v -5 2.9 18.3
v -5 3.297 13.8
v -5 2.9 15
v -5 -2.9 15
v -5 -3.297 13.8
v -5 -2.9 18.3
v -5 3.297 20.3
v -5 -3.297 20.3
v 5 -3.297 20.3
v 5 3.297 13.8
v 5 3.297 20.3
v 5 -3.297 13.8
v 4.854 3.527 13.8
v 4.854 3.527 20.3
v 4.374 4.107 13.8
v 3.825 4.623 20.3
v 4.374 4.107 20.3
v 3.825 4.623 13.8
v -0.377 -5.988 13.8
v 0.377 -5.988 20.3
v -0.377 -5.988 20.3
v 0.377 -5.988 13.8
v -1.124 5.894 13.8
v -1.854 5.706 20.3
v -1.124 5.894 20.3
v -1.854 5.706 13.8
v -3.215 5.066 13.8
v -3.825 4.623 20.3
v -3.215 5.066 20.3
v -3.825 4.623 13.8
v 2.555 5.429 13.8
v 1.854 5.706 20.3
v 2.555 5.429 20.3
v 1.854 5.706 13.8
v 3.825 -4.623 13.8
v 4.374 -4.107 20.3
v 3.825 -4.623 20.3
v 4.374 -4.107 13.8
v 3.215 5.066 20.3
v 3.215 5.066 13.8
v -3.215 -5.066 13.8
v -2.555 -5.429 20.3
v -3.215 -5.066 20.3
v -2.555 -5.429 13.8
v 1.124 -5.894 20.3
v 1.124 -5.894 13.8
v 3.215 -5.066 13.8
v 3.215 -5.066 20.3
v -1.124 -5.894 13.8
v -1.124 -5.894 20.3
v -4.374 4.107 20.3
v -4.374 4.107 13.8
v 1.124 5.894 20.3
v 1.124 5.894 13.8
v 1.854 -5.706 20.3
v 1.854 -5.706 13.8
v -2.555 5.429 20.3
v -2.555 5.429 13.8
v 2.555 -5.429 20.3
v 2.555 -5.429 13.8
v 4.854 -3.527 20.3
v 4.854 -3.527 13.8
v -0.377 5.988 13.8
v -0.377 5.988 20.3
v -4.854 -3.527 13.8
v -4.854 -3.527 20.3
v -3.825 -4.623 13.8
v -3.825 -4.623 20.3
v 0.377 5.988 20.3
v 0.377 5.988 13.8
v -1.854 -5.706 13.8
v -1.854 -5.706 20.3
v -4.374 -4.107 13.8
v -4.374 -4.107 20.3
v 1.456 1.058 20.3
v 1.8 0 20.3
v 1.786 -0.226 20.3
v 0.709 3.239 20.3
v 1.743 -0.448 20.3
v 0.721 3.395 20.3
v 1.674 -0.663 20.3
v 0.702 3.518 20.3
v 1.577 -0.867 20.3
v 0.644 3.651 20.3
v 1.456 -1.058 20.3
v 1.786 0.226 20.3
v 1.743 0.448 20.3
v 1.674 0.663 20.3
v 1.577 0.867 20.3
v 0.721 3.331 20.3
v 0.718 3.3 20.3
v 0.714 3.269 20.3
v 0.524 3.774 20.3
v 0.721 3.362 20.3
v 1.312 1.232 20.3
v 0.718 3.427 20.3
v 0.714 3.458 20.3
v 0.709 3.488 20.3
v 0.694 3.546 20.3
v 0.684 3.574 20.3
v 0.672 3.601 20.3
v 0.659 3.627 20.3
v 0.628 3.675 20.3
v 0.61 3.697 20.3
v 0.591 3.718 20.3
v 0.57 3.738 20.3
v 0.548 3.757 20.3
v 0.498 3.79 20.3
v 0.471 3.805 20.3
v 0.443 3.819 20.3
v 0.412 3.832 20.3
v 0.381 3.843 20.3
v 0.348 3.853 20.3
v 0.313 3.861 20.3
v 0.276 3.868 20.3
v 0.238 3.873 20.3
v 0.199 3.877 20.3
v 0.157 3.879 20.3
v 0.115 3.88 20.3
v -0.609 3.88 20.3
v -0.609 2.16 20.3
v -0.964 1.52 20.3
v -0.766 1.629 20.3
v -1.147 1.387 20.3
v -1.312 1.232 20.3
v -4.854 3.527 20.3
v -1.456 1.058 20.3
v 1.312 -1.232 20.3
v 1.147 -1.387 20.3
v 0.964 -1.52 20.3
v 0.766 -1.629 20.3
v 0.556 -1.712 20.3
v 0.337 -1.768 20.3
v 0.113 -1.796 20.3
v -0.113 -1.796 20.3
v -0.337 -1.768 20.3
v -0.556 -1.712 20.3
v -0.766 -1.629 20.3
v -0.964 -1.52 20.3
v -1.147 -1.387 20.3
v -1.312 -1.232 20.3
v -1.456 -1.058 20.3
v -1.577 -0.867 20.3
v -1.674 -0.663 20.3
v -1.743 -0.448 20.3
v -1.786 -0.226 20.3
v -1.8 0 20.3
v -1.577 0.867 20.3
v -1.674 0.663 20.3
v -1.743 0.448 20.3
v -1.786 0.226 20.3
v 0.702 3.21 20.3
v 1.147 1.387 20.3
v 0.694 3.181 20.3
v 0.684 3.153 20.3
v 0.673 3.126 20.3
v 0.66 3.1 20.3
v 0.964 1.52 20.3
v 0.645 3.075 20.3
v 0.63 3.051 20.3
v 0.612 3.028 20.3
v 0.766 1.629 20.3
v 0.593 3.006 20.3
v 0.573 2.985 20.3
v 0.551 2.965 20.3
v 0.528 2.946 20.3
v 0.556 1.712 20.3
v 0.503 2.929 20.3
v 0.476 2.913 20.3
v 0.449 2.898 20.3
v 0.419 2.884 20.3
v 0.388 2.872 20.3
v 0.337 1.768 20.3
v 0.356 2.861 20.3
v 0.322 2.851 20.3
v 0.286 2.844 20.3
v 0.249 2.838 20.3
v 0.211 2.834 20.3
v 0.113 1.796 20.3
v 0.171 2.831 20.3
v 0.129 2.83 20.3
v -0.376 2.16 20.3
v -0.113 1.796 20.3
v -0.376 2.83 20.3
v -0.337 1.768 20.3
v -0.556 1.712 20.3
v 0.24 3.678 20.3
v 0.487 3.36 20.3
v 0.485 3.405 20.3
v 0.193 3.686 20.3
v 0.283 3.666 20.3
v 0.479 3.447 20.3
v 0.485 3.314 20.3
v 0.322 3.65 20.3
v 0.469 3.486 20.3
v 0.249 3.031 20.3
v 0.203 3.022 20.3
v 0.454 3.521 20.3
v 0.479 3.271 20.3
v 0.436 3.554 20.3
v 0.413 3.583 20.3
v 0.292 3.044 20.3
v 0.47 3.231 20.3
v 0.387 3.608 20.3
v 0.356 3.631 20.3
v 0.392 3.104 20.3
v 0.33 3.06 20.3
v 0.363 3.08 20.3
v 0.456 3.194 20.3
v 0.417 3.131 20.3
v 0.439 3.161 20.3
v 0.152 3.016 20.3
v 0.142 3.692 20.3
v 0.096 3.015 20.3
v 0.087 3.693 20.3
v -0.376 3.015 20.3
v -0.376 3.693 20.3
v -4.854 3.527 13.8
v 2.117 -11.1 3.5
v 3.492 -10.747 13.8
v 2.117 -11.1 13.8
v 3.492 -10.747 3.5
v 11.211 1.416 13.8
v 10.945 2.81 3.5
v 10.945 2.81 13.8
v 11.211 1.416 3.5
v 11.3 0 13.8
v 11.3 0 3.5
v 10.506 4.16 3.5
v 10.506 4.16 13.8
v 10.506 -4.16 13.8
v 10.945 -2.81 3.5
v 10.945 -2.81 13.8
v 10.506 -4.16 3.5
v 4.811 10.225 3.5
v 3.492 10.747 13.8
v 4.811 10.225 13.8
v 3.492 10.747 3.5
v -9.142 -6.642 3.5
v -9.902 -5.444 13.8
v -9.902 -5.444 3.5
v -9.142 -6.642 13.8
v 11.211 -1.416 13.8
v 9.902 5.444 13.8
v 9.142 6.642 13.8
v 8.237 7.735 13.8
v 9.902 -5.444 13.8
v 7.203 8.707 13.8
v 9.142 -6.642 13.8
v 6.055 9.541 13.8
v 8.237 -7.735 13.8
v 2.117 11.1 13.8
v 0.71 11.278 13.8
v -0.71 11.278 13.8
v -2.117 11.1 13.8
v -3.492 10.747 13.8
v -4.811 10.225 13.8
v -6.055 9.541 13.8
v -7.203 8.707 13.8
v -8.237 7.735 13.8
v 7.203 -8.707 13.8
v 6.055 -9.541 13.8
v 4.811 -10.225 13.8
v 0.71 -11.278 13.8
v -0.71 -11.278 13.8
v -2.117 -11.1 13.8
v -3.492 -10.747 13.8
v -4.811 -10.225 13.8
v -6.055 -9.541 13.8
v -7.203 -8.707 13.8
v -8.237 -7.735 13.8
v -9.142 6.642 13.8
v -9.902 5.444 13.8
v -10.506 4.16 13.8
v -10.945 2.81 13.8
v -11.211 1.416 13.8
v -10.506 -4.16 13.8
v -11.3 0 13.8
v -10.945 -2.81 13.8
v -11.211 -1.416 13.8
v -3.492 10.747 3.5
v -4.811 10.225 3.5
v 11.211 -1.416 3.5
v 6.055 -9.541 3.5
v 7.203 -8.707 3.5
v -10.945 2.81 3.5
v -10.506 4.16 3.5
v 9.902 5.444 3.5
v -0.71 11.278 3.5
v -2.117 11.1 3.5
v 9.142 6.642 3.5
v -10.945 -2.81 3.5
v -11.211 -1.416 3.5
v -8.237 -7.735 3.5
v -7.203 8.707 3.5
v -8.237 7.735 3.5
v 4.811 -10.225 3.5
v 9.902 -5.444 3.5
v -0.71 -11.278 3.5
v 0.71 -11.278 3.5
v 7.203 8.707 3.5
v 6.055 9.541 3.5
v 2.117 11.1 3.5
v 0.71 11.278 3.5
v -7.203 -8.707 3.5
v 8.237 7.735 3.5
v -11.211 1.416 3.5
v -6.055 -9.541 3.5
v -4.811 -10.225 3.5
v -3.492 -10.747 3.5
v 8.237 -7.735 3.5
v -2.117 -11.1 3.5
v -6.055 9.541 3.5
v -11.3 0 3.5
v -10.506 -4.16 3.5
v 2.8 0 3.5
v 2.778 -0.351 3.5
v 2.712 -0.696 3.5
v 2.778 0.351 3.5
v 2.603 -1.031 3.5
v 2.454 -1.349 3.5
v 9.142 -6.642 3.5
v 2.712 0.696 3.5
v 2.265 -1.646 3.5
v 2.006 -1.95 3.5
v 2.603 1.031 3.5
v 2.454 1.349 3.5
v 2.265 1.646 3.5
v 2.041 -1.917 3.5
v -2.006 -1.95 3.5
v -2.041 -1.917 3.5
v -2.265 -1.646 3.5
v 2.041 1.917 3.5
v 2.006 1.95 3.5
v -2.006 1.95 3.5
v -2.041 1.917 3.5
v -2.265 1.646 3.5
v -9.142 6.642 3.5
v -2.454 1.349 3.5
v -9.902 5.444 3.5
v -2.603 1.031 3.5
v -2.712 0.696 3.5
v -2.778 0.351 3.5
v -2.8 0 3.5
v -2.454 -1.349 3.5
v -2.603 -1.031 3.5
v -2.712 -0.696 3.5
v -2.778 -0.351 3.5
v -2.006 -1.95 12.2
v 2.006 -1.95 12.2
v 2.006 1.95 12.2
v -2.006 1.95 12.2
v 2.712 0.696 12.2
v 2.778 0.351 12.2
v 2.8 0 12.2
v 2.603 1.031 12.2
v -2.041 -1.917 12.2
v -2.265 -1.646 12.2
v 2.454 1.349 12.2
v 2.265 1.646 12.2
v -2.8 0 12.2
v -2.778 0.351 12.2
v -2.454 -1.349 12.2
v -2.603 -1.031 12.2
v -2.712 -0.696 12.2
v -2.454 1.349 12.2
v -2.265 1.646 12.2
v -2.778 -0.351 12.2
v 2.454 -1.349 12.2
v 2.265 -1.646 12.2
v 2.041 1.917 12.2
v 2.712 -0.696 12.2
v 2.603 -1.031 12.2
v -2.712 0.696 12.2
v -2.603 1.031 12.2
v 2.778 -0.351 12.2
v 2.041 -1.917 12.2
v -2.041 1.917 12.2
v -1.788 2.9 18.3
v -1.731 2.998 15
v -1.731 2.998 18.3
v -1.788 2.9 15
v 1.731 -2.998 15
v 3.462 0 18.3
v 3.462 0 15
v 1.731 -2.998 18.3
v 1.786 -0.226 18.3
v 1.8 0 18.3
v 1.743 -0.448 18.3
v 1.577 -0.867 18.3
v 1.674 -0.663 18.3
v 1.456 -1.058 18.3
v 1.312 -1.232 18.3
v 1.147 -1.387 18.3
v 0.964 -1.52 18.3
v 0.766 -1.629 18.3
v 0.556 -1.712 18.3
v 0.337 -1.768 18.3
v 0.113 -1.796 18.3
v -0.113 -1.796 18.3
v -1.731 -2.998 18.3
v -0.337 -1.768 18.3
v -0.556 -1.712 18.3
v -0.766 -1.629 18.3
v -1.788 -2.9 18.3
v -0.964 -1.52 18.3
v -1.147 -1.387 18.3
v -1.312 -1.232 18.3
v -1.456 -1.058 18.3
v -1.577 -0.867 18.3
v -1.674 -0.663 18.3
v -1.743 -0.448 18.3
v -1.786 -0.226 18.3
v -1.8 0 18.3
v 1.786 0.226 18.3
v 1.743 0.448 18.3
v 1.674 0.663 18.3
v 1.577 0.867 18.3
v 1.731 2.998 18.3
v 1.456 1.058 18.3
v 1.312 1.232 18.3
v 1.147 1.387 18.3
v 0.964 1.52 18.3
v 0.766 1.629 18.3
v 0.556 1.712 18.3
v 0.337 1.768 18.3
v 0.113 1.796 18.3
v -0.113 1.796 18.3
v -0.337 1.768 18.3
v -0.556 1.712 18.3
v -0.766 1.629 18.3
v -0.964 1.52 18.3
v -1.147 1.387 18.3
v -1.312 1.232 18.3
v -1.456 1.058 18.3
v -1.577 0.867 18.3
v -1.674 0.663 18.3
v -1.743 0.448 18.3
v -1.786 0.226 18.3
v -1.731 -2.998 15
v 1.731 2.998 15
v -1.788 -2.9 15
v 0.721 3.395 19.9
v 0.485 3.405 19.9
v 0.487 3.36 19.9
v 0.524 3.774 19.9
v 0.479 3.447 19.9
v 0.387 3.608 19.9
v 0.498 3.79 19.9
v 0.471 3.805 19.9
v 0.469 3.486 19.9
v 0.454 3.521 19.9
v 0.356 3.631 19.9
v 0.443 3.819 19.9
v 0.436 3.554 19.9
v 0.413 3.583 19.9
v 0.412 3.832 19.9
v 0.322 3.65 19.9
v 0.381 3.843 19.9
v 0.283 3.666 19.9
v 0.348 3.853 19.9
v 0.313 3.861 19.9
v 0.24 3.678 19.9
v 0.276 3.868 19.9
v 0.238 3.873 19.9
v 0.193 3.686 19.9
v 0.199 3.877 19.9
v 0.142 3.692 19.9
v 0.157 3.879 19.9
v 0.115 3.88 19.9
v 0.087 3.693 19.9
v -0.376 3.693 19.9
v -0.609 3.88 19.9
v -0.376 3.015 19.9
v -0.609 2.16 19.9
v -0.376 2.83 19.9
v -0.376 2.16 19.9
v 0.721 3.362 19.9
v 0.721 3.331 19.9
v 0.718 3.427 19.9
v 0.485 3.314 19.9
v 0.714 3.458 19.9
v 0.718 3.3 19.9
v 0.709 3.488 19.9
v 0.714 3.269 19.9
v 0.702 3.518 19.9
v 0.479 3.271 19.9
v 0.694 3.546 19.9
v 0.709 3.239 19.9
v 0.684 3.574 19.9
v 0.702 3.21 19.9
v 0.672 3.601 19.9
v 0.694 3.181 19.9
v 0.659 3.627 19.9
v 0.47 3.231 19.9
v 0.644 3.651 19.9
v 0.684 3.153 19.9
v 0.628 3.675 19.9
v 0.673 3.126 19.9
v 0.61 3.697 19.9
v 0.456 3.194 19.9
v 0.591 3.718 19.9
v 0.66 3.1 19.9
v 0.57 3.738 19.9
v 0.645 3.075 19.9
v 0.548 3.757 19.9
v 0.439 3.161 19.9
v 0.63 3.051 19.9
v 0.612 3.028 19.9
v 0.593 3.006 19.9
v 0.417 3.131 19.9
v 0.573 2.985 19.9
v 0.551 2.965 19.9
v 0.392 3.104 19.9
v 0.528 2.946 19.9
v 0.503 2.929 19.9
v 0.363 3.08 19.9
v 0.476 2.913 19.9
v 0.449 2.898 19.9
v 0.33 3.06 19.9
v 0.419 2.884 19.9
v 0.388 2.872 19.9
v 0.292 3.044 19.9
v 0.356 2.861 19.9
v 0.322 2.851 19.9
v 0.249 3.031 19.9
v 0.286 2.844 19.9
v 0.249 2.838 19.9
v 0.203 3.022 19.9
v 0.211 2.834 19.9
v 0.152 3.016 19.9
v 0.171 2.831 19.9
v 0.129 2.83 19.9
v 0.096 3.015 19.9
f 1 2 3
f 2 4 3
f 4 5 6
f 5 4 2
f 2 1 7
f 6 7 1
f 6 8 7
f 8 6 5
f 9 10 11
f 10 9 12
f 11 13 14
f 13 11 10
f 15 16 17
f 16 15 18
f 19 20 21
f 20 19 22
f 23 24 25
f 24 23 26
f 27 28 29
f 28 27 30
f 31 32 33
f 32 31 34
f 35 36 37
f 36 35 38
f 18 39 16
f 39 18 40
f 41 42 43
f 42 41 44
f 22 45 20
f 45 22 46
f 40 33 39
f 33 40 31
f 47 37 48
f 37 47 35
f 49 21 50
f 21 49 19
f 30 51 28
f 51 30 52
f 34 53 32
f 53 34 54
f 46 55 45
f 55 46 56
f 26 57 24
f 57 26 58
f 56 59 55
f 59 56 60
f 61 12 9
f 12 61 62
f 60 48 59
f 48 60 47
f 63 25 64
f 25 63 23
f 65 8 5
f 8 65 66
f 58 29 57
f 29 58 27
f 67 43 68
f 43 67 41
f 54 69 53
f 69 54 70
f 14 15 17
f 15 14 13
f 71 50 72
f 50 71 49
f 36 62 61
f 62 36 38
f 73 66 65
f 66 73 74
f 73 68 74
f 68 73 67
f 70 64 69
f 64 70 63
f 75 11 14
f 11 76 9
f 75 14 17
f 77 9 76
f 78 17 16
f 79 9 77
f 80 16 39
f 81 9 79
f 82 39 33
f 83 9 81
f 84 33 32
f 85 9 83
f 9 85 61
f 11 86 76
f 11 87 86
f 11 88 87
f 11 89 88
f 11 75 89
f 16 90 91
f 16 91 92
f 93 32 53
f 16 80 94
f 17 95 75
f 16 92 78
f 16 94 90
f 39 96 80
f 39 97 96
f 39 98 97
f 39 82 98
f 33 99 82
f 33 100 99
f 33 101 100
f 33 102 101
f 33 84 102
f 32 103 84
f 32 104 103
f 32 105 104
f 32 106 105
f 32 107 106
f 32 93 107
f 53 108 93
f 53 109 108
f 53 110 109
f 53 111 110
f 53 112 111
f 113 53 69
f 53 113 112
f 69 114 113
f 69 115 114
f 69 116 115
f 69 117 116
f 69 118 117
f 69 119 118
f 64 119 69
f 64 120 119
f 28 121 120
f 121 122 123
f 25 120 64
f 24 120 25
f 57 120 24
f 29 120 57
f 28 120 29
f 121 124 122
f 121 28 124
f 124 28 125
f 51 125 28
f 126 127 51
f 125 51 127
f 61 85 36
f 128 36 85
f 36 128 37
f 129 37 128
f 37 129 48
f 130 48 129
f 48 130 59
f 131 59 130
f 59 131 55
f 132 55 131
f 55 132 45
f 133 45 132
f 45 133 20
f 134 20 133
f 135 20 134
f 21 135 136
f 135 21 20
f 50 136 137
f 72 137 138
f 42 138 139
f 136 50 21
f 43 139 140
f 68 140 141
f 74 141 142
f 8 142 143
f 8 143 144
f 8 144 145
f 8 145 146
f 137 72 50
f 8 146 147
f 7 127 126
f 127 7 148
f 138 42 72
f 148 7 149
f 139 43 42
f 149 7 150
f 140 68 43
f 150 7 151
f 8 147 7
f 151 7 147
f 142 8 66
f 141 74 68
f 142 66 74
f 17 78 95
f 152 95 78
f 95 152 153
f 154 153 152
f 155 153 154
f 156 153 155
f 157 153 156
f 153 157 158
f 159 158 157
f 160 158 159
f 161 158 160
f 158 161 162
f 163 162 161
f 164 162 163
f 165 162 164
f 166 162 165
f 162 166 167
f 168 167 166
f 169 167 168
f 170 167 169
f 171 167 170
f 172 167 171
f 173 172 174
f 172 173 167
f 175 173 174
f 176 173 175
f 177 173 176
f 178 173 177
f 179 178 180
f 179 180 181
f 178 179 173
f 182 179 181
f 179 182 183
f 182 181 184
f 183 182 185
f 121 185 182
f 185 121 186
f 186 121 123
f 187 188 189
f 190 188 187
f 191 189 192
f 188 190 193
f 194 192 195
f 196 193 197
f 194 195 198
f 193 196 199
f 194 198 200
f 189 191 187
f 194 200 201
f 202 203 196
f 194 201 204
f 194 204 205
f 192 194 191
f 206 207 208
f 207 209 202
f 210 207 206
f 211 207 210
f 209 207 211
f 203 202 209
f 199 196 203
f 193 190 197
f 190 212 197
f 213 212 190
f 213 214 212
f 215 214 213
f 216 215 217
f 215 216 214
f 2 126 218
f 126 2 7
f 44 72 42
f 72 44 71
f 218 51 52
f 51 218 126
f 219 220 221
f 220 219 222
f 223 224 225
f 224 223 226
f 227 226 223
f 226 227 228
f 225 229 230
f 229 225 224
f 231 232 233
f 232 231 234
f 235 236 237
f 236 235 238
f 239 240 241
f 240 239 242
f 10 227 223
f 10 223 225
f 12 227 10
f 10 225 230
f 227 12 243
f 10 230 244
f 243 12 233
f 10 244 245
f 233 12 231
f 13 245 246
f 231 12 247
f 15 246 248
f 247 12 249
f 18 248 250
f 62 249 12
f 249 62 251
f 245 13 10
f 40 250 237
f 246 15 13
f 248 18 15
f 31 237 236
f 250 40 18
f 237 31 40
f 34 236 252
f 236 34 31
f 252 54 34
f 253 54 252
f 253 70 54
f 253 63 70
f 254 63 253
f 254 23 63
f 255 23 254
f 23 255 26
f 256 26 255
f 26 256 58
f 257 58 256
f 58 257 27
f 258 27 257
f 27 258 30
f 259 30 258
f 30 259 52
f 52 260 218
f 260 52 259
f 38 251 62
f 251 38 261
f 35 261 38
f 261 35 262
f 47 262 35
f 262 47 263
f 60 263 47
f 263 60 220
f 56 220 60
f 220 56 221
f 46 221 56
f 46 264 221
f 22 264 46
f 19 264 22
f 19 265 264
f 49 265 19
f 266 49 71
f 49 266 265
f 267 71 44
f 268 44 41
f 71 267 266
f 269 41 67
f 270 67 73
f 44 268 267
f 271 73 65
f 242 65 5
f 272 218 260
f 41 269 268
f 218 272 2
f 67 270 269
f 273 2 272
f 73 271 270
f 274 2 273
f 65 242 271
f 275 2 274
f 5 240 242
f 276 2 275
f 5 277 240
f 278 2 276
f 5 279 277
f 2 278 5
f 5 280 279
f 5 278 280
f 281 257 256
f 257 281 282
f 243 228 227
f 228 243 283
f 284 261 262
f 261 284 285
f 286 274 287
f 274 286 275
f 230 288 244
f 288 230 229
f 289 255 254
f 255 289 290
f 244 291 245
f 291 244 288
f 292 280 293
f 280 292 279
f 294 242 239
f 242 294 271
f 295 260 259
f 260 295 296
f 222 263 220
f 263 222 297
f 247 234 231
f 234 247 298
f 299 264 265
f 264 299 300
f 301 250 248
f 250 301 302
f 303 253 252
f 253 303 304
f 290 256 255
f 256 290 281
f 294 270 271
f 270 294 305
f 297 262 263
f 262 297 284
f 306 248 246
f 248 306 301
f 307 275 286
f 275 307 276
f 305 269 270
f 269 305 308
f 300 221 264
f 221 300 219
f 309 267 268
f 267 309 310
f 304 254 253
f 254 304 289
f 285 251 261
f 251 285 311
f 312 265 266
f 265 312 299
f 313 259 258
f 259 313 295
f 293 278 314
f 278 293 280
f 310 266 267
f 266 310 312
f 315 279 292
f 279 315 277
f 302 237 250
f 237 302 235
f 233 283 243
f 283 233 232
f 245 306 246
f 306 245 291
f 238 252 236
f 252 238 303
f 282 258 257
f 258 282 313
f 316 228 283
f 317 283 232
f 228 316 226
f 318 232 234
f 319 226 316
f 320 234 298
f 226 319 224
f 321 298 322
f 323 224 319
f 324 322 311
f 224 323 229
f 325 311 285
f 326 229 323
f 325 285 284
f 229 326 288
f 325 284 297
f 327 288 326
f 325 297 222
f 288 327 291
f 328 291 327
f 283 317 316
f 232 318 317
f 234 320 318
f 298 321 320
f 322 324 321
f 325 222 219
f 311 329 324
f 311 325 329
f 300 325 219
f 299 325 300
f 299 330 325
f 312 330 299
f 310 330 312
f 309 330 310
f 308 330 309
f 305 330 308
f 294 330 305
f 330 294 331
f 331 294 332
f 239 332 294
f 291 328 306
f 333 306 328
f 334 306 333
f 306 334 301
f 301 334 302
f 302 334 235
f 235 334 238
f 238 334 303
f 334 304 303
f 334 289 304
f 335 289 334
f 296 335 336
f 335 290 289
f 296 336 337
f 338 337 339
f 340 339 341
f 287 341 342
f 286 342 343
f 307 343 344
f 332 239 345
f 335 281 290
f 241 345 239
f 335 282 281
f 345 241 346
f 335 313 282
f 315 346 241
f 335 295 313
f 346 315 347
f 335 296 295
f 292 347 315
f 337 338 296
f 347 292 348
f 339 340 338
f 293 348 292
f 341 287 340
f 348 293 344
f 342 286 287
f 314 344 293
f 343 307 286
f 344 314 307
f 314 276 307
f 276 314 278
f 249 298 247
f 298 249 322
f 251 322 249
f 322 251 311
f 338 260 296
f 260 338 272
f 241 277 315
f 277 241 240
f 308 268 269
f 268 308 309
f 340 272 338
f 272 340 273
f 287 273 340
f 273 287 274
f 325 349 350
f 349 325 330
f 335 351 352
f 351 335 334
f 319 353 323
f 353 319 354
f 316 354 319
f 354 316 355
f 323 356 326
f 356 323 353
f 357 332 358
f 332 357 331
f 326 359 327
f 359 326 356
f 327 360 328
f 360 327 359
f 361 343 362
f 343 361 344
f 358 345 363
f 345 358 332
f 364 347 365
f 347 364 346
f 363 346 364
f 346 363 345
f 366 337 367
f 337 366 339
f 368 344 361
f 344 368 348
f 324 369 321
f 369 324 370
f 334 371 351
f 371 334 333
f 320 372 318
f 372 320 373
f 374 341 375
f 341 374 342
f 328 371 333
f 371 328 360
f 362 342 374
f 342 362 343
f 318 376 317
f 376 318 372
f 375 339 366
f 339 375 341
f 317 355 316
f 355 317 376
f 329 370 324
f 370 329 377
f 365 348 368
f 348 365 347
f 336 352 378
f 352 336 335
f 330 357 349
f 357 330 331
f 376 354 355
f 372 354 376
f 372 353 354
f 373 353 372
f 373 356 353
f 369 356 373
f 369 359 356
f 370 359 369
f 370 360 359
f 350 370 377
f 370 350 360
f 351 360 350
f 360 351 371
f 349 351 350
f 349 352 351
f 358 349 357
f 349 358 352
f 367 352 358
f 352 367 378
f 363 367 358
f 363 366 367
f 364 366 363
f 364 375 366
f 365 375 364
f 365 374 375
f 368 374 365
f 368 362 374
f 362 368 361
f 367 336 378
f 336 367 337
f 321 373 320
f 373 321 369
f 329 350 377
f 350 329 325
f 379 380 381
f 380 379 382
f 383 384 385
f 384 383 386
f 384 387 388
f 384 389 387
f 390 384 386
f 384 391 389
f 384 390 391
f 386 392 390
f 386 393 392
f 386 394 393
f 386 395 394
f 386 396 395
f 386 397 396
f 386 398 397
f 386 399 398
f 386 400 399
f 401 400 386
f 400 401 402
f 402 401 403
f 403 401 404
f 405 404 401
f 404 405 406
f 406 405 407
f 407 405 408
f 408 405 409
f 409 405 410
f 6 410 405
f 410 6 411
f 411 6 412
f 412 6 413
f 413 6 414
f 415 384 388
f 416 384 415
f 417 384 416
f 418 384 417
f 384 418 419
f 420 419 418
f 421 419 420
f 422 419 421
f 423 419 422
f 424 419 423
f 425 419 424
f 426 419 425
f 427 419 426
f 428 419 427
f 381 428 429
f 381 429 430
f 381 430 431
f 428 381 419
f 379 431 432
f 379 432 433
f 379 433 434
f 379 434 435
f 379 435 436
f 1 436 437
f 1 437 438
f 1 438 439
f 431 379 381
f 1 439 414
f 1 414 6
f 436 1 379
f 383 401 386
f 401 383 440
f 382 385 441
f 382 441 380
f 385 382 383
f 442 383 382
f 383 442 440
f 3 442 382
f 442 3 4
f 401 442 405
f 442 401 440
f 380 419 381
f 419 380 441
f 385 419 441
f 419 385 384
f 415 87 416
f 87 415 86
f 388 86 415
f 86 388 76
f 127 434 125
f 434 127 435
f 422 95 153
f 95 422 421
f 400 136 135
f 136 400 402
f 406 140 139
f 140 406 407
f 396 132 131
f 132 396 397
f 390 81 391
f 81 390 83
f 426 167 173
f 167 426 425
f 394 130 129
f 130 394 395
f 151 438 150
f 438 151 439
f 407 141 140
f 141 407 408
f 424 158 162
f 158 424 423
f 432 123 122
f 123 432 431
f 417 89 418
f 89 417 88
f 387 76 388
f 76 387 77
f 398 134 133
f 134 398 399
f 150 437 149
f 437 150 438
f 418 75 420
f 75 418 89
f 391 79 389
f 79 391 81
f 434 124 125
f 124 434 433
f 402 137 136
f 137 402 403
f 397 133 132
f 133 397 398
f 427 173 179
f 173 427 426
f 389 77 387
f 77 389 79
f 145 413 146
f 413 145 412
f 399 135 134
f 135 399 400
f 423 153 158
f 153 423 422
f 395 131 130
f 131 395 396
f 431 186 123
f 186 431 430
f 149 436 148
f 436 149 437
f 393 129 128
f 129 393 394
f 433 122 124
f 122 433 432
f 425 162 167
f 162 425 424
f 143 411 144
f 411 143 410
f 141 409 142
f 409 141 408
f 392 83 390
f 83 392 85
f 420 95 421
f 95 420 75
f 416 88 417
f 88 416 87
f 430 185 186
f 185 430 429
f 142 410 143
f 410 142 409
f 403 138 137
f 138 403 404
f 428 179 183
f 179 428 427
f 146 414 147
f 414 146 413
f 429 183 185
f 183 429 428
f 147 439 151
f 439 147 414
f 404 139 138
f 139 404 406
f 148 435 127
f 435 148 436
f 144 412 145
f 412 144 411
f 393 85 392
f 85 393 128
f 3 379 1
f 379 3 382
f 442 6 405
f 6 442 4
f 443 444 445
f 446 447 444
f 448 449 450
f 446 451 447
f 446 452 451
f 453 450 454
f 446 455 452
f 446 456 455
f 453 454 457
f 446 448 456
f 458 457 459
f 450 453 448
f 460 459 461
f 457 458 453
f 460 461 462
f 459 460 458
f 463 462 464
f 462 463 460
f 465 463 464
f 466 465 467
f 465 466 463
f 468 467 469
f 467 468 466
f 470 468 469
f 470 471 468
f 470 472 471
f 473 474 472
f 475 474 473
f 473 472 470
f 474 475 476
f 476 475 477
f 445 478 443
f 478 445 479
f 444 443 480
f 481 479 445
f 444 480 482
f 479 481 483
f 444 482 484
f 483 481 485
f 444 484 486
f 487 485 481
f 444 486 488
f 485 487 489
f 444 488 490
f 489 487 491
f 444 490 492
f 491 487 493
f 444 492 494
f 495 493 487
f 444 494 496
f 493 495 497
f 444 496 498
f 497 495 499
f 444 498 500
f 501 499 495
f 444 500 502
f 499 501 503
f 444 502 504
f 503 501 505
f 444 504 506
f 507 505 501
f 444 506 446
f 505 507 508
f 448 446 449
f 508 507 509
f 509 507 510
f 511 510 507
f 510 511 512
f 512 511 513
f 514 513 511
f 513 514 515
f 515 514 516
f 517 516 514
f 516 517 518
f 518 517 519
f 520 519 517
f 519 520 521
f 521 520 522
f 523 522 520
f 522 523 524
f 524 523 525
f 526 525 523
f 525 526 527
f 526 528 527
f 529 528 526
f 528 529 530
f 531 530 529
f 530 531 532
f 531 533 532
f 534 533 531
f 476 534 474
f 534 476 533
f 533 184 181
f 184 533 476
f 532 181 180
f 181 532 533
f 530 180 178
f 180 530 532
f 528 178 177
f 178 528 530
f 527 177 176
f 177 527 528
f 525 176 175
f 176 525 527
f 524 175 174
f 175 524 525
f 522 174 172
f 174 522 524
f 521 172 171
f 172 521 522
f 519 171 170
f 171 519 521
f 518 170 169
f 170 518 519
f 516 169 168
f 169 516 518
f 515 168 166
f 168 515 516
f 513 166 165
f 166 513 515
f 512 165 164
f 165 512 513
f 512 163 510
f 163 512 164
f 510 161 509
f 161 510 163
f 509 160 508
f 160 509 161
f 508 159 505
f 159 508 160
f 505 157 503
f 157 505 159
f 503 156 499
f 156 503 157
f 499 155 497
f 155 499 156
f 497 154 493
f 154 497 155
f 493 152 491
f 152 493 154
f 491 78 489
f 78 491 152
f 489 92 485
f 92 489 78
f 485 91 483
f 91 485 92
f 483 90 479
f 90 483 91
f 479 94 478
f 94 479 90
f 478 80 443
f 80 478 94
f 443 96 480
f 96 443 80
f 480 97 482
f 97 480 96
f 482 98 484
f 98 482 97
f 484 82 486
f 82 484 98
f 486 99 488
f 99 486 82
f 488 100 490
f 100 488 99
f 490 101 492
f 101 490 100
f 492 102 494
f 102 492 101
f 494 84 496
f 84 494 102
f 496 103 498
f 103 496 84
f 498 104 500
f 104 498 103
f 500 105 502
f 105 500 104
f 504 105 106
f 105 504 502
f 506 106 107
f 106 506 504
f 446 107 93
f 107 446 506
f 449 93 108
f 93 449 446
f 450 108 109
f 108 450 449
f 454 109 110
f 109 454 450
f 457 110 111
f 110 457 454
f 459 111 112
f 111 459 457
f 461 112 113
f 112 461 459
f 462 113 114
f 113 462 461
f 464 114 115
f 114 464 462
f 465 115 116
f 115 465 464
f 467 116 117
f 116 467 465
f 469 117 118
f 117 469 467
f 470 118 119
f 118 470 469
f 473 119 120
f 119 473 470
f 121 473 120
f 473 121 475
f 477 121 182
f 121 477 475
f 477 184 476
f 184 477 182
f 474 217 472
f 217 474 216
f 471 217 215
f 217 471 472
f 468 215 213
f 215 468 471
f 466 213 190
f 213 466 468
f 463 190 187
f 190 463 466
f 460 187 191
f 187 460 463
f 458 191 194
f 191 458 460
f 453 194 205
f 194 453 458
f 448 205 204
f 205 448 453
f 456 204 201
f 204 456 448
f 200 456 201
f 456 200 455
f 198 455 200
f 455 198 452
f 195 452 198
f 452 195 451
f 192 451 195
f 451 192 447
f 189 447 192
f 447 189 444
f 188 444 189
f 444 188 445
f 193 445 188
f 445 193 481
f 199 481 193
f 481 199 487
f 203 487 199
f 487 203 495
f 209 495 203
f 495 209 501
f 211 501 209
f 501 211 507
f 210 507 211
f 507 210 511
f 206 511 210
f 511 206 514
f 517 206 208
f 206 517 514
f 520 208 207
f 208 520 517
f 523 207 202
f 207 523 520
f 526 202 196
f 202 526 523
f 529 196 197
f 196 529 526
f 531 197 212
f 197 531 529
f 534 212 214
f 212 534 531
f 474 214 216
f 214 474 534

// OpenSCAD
$fn = 50;

difference() {
	union() {
		translate(v = [0, 0, 0]) {
			rotate(a = [0, 0, 0]) {
				difference() {
					union() {
						translate(v = [0, 0, 0]) {
							rotate(a = [0, 0, 0]) {
								difference() {
									union() {
										translate(v = [0, 0, 13.79]) {
											cylinder(h = 6.51, r = 6.0);
										}
									}
									union() {
										translate(v = [-25.0, -20.0, 12.790000000000001]) {
											cube(size = [20, 40, 8.51]);
										}
										translate(v = [5.0, -20.0, 12.790000000000001]) {
											cube(size = [20, 40, 8.51]);
										}
									}
								}
							}
						}
						translate(v = [0, 0, 3.5]) {
							cylinder(h = 10.3, r = 11.3);
						}
					}
					union() {
						translate(v = [0, 0, 0]) {
							rotate(a = [0, 0, 0]) {
								difference() {
									union() {
										translate(v = [0, 0, 3.4]) {
											cylinder(h = 8.799999999999999, r = 2.8000000000000003);
										}
									}
									union() {
										translate(v = [-20.0, -21.95, 2.4]) {
											cube(size = [40, 20, 10.799999999999999]);
										}
										translate(v = [-20.0, 1.9499999999999993, 2.4]) {
											cube(size = [40, 20, 10.799999999999999]);
										}
									}
								}
							}
						}
						translate(v = [0, 0, 15]) {
							rotate(a = [0, 0, 0]) {
								difference() {
									union() {
										linear_extrude(height = 3.3) {
											polygon(points = [[3.4619999999999997, 0.0], [1.7310000000000003, 2.9981799479017264], [-1.7309999999999992, 2.9981799479017264], [-3.4619999999999997, 4.2397272186481365e-16], [-1.7310000000000014, -2.998179947901726], [1.7309999999999977, -2.9981799479017277]]);
										}
									}
									union();
								}
							}
						}
						translate(v = [0, 0, 15]) {
							cylinder(h = 6.300000000000001, r = 1.8);
						}
						translate(v = [-8.0, -2.9, 15]) {
							cube(size = [8, 5.8, 3.3]);
						}
						translate(v = [0, 3, 19.900000000000002]) {
							linear_extrude(height = 0.45) {
								text(font = "Liberation Sans", halign = "center", size = 1.8, text = "P", valign = "center");
							}
						}
					}
				}
			}
		}
	}
	union();
}
